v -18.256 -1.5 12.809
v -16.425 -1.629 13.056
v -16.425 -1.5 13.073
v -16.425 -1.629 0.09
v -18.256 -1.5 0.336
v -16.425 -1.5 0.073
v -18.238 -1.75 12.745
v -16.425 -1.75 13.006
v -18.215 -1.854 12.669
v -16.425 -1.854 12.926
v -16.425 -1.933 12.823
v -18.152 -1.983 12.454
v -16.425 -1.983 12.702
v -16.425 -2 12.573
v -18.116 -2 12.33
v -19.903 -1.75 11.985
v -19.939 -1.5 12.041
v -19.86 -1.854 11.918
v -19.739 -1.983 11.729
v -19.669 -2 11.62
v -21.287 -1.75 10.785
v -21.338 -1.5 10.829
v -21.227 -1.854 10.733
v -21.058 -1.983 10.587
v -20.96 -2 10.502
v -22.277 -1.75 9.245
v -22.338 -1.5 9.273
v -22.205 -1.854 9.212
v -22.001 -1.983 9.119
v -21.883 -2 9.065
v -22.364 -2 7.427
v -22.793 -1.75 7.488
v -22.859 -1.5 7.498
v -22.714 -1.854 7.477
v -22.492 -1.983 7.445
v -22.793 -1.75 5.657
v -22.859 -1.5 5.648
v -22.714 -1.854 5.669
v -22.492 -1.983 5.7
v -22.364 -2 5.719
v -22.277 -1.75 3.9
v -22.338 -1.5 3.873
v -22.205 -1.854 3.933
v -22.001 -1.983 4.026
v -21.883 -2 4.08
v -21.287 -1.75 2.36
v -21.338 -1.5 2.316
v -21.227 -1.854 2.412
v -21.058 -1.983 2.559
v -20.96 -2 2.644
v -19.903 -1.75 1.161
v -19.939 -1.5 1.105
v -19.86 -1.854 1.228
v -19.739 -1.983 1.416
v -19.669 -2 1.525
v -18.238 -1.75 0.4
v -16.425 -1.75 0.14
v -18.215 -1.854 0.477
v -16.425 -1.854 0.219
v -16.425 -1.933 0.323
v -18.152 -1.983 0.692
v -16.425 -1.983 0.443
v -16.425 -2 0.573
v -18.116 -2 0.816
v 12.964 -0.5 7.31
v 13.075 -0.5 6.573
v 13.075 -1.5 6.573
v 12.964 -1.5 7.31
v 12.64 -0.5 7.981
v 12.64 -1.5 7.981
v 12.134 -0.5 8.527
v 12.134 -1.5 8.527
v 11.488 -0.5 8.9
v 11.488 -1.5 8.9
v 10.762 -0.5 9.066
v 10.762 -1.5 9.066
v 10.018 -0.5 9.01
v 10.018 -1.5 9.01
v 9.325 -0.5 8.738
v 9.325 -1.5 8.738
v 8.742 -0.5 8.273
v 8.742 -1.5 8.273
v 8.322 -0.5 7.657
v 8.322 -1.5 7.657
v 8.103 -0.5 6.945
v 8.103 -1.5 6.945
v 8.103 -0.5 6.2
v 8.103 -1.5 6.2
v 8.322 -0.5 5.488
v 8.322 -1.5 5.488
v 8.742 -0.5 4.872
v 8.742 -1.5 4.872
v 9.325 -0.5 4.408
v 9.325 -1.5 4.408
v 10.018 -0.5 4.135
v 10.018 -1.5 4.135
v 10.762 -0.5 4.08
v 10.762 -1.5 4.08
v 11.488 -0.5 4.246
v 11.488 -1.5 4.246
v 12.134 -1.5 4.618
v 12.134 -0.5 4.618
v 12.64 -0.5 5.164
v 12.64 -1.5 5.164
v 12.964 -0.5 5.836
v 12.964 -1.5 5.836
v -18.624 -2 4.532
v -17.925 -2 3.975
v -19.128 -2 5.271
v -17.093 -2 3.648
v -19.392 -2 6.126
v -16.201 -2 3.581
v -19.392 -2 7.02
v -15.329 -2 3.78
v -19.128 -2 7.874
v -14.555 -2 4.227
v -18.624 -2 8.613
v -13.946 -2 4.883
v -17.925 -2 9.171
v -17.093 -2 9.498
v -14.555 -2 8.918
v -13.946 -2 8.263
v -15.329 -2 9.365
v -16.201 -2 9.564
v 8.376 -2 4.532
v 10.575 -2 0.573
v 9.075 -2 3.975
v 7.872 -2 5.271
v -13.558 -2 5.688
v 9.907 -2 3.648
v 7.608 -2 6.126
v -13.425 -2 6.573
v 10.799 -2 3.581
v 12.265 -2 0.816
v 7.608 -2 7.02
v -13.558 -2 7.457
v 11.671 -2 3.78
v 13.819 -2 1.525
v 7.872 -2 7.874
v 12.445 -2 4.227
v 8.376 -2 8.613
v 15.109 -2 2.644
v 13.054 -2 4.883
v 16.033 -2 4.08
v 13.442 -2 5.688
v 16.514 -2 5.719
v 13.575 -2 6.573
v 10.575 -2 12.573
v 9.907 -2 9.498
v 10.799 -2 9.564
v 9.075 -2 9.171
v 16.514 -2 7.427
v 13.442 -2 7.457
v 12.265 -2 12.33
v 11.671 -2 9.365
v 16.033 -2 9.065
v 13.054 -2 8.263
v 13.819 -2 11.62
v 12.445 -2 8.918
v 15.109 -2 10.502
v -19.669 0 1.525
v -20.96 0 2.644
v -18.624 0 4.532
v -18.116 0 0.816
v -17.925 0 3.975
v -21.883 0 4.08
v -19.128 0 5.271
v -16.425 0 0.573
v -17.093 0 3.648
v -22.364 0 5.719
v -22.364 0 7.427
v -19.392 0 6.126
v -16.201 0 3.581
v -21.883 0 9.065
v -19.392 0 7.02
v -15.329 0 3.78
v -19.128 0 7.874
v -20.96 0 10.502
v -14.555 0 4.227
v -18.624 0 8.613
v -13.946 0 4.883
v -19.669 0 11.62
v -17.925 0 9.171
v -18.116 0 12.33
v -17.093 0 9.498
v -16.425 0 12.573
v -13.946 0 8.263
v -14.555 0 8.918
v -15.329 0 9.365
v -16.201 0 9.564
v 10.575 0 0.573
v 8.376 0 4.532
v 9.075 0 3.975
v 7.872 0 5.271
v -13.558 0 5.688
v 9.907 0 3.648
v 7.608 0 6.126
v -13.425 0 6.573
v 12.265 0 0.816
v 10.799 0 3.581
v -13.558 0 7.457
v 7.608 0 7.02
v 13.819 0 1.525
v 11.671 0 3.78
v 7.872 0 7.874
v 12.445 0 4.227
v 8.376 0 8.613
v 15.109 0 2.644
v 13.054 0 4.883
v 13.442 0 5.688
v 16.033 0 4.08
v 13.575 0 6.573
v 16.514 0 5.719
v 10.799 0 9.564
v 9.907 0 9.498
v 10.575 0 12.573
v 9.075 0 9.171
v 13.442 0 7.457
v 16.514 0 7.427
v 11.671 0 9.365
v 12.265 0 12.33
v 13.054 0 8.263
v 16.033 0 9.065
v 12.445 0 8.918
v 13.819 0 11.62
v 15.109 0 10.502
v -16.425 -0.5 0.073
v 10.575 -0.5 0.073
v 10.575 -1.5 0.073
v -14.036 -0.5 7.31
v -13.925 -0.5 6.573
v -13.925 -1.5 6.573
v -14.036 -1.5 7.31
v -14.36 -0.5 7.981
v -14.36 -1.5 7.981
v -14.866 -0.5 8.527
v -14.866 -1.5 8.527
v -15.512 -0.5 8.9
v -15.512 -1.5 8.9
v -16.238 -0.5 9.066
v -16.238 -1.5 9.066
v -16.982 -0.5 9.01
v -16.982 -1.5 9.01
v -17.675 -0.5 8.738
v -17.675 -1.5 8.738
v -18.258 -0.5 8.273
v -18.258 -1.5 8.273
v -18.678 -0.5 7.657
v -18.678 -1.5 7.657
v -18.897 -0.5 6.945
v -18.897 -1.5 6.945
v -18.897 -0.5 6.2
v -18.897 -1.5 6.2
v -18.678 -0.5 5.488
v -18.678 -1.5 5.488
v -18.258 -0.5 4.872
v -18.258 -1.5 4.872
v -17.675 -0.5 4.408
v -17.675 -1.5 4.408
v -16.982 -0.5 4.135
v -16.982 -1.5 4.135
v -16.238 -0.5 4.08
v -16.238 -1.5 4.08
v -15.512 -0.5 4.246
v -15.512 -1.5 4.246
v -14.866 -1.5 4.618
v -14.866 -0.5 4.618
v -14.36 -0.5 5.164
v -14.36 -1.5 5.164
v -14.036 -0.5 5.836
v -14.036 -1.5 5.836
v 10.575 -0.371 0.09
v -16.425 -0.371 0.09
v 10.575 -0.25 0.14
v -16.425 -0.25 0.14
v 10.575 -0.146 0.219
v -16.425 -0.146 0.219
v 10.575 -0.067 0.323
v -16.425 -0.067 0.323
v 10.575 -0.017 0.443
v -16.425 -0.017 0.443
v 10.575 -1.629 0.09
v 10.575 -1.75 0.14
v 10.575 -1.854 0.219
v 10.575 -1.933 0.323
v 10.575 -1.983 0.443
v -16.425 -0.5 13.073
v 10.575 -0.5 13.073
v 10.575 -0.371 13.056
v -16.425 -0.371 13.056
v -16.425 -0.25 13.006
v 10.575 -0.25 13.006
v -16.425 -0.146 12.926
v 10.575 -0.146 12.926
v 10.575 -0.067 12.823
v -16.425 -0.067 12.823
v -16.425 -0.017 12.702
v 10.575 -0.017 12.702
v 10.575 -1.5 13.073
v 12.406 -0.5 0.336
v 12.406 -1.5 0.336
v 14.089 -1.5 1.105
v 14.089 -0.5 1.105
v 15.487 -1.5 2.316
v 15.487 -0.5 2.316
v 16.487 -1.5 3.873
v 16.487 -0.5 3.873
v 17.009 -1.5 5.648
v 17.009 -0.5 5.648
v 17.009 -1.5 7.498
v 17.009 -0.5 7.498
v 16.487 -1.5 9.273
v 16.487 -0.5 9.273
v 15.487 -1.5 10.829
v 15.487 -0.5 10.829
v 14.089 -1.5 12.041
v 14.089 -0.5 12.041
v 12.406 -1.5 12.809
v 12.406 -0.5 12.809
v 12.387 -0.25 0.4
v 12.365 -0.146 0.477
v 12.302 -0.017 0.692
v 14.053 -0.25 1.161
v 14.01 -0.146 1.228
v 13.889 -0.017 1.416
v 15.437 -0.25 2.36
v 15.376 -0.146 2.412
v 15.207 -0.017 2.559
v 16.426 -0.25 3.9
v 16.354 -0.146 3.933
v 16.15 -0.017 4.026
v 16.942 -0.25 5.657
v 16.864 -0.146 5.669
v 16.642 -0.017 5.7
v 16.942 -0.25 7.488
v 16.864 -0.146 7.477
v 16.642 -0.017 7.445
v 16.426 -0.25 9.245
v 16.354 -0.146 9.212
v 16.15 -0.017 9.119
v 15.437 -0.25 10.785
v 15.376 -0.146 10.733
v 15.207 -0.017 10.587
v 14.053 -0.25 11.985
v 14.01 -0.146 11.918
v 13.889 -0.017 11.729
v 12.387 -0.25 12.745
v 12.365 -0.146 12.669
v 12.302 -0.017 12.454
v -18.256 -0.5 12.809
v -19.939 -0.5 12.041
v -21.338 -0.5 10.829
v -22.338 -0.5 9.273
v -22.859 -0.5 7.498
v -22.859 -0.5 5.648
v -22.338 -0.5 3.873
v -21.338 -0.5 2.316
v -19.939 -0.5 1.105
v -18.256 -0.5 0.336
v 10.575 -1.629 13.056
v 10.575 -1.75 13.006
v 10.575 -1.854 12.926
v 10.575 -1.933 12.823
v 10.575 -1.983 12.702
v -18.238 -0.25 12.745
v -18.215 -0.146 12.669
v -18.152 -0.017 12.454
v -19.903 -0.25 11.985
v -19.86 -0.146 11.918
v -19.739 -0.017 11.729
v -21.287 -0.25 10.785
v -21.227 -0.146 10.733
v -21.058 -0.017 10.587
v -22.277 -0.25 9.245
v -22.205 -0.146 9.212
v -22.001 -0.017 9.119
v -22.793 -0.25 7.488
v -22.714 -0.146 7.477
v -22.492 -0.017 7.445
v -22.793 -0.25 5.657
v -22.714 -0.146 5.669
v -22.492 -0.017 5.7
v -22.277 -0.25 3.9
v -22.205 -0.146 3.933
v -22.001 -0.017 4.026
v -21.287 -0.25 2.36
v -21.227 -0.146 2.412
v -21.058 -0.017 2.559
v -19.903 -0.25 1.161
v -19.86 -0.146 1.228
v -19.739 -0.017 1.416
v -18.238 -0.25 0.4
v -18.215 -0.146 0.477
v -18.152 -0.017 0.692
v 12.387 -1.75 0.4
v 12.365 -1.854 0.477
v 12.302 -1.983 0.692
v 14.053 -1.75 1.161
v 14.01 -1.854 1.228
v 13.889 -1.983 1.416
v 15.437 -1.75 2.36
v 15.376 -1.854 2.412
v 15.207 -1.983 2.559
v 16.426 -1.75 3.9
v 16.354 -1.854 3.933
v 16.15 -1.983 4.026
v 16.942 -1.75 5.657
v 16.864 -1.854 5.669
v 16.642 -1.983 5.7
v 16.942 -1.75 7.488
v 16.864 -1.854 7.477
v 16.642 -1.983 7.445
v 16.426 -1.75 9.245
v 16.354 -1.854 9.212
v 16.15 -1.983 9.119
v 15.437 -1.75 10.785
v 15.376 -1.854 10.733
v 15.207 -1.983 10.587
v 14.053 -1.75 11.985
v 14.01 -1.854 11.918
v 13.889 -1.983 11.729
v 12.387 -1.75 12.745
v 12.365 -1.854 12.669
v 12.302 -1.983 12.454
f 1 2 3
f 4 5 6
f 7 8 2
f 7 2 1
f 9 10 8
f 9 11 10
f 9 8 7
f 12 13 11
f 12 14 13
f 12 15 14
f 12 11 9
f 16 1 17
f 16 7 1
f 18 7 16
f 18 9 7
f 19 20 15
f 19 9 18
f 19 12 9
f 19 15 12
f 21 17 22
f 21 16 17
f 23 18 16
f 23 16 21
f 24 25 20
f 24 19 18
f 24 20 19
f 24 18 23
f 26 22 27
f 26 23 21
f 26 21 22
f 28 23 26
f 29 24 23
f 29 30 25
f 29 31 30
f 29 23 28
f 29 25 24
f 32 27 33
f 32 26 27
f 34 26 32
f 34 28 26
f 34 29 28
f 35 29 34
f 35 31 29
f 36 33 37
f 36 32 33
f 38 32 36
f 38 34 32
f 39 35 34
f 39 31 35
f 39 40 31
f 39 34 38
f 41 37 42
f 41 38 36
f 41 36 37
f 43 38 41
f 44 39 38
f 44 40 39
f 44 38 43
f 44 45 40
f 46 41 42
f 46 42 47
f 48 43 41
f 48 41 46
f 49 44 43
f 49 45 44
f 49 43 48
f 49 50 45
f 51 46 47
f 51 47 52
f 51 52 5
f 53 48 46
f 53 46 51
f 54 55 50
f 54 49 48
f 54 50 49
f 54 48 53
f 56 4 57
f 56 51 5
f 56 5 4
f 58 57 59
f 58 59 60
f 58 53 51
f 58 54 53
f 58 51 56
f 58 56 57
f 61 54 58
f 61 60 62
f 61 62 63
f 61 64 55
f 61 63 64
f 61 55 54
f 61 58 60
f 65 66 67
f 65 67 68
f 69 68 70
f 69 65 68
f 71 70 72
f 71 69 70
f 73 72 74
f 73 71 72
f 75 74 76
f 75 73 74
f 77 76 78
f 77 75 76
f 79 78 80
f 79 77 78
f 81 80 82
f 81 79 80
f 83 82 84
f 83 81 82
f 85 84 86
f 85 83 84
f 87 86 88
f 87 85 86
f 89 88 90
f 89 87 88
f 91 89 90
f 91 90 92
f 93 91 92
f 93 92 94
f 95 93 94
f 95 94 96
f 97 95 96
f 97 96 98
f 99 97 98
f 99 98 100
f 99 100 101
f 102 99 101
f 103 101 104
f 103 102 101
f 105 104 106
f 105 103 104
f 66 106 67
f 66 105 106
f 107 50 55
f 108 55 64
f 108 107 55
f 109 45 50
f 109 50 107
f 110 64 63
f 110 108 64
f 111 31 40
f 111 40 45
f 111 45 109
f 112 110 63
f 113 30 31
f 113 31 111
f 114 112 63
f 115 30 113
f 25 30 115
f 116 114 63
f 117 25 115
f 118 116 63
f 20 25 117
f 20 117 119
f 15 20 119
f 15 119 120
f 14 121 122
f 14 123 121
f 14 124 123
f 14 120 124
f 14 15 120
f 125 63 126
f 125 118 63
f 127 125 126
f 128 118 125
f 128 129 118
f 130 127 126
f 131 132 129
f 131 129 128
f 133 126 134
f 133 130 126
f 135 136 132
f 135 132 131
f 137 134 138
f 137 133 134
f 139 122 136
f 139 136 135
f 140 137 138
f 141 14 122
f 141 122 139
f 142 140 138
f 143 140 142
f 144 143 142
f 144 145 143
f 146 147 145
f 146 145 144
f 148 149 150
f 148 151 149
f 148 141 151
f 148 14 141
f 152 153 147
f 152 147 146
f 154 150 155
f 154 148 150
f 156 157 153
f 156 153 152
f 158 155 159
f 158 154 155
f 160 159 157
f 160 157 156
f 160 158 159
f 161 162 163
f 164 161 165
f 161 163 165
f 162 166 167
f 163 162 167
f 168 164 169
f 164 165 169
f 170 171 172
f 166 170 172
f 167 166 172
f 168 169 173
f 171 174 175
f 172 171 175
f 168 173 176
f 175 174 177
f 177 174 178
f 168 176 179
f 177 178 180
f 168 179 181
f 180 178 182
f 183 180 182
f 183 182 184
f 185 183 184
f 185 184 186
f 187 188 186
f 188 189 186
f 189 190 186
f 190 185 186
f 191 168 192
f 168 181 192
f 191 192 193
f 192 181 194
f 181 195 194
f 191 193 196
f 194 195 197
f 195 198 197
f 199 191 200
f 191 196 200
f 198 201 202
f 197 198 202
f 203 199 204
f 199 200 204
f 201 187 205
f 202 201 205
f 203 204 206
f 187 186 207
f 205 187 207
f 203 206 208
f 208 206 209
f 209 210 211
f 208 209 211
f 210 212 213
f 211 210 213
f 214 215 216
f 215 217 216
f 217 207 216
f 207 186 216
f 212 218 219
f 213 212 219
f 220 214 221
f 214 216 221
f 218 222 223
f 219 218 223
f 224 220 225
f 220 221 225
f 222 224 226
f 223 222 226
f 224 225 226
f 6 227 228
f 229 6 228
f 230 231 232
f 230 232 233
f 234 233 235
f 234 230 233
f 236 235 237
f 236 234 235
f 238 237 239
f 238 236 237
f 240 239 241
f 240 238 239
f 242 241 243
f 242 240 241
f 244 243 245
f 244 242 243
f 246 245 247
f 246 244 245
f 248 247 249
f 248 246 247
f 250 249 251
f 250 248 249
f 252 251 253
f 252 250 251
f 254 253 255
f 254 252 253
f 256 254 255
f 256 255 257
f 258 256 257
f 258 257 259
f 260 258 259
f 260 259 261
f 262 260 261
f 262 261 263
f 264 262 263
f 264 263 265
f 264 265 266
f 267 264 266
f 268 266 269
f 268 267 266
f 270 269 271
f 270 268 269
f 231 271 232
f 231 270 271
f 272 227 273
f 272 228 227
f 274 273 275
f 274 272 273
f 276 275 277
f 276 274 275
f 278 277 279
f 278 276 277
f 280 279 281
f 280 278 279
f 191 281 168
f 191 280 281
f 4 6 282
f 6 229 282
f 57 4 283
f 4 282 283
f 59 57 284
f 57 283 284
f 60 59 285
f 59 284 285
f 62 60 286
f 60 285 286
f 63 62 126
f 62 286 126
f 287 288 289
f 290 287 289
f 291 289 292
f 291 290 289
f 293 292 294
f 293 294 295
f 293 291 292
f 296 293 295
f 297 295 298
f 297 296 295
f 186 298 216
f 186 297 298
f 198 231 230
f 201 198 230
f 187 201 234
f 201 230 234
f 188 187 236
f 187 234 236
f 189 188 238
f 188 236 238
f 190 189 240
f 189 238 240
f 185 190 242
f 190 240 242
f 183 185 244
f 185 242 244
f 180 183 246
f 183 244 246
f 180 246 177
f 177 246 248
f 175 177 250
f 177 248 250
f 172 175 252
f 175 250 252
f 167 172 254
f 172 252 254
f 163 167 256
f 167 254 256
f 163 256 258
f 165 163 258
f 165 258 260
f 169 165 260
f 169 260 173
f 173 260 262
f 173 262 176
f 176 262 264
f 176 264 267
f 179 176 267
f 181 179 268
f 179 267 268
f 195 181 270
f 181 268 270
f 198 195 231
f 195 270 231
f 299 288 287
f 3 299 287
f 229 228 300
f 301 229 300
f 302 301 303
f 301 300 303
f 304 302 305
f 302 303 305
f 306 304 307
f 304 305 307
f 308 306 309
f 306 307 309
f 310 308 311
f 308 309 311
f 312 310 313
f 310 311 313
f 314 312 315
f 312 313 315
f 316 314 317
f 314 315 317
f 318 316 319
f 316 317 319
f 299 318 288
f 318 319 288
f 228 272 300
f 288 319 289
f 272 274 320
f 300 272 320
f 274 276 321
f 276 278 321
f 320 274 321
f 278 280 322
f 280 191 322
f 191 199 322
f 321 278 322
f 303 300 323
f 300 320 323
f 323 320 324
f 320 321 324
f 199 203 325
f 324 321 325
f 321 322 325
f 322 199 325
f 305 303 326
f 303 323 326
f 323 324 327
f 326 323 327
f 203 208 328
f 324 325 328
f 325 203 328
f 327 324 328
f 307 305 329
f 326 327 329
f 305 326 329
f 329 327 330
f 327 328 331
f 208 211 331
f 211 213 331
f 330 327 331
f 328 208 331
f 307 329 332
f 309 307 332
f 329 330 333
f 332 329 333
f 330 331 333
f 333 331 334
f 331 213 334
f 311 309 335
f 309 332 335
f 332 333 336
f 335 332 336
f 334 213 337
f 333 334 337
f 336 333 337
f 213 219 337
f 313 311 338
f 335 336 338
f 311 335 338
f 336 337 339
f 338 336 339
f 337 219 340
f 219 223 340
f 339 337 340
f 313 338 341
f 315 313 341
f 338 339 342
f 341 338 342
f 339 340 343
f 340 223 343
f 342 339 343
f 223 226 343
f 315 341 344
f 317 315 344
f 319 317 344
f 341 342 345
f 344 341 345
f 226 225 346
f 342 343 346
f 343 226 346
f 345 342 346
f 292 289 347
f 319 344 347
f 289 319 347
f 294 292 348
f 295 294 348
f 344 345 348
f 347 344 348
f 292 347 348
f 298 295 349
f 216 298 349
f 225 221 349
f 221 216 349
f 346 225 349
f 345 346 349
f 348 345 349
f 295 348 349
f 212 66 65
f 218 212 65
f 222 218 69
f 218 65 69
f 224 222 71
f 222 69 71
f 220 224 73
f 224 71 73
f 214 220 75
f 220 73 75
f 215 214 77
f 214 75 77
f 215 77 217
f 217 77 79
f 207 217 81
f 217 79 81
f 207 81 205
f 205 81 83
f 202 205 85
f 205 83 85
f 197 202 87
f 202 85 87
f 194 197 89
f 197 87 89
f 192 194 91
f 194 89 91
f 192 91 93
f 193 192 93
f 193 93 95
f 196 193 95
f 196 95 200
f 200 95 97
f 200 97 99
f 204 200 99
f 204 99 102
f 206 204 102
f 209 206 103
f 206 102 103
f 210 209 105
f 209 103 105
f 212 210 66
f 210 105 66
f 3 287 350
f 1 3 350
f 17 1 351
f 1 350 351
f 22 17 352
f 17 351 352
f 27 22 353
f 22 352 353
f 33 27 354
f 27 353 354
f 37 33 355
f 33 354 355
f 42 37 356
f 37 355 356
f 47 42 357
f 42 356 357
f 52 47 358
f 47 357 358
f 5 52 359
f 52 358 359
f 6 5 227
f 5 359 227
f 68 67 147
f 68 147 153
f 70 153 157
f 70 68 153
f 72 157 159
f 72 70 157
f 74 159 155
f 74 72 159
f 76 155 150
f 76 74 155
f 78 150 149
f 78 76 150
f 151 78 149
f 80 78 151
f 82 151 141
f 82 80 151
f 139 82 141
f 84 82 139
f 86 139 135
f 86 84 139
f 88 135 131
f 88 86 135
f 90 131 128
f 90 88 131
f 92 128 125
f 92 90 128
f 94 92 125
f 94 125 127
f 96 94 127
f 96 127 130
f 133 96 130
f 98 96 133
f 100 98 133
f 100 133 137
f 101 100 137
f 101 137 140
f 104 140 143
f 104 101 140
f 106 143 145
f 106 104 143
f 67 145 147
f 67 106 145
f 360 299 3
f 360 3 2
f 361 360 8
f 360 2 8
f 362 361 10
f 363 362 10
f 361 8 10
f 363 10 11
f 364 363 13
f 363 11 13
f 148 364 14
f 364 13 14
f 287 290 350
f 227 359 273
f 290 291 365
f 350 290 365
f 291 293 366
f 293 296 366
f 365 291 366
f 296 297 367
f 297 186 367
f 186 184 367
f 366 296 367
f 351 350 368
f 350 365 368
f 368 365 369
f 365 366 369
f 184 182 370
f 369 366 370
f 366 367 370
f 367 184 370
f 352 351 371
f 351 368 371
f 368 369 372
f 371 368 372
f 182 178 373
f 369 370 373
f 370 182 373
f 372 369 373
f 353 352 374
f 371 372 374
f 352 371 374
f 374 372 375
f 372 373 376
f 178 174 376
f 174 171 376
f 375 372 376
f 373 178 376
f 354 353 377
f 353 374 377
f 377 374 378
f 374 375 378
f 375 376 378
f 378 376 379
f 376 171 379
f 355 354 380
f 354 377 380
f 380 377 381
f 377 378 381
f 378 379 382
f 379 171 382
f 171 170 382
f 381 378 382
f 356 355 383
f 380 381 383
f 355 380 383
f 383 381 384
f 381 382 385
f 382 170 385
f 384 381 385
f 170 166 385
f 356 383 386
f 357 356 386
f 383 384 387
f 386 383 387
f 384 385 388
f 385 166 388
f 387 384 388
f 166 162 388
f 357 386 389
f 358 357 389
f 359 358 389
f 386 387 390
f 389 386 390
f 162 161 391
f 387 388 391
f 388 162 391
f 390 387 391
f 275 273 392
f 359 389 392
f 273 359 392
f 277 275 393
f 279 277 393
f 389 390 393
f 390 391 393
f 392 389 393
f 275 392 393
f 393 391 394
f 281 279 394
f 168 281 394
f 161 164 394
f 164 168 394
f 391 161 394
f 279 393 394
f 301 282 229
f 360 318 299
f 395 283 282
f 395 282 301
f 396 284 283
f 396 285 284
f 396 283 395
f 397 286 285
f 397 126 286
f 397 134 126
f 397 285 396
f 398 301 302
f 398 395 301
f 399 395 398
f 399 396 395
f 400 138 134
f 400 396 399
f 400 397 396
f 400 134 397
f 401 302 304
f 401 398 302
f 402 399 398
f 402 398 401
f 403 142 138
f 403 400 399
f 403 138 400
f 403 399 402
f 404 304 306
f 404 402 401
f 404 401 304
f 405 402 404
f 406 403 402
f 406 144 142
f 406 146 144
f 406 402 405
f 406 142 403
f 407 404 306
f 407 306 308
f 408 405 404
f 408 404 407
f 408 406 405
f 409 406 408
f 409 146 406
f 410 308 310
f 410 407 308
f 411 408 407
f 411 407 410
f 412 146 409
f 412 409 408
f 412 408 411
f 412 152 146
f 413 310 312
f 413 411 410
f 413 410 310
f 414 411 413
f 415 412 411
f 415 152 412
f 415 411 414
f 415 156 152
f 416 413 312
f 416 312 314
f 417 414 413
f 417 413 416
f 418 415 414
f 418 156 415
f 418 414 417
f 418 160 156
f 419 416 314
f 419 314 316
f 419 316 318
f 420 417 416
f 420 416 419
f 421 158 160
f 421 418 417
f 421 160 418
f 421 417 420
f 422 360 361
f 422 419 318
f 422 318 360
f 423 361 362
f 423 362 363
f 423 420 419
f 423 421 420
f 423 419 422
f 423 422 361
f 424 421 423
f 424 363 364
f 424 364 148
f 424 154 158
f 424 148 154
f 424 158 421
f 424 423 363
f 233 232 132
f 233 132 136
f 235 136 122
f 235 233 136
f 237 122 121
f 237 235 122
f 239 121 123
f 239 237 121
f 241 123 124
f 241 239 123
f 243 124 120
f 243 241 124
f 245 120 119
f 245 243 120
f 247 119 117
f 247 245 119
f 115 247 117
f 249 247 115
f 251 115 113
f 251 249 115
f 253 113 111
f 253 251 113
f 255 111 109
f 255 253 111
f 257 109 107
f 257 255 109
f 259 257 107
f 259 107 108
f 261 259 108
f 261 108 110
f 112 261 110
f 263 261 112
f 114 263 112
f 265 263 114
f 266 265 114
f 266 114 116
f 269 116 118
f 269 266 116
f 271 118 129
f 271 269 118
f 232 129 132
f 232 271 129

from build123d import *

# Parameters (mm, degrees)
F0_R     = 2.5
F1_DEPTH = 2
F2_R     = 0.5
F3_SIZE  = 0.5


with BuildPart() as f1:
    # F0 (on Front) → F1 (new body)
    with BuildSketch(Plane.XZ):
        with BuildLine():
            Line((10.5747856316, 13.0727361555), (-16.4252143684, 13.0727361555))
            ThreePointArc((-16.4252143684, 13.0727361555), (-22.9252143684, 6.5727361555), (-16.4252143684, 0.0727361555))
            Line((-16.4252143684, 0.0727361555), (10.5747856316, 0.0727361555))
            ThreePointArc((10.5747856316, 0.0727361555), (17.0747856316, 6.5727361555), (10.5747856316, 13.0727361555))
        make_face()
        with Locations((10.5747856316, 6.5727361555)):
            Circle(F0_R, mode=Mode.SUBTRACT)
        with Locations((-16.4252143684, 6.5727361555)):
            Circle(F0_R, mode=Mode.SUBTRACT)
    extrude(amount=F1_DEPTH)

    # F2
    f2_edges = [f1.edges().sort_by_distance(p)[0] for p in [
        (-22.925214, -2, 6.572736),
        (-2.925214, 0, 0.072736),
    ]]
    fillet(f2_edges, radius=F2_R)

    # F3
    f3_edges = [f1.edges().sort_by_distance(p)[0] for p in [
        (-18.925214, -2, 6.572736),
        (8.074786, 0, 6.572736),
        (8.074786, -2, 6.572736),
        (-2.925214, -0.5, 13.072736),
        (-18.925214, 0, 6.572736),
    ]]
    chamfer(f3_edges, length=F3_SIZE)


solid = f1.part
